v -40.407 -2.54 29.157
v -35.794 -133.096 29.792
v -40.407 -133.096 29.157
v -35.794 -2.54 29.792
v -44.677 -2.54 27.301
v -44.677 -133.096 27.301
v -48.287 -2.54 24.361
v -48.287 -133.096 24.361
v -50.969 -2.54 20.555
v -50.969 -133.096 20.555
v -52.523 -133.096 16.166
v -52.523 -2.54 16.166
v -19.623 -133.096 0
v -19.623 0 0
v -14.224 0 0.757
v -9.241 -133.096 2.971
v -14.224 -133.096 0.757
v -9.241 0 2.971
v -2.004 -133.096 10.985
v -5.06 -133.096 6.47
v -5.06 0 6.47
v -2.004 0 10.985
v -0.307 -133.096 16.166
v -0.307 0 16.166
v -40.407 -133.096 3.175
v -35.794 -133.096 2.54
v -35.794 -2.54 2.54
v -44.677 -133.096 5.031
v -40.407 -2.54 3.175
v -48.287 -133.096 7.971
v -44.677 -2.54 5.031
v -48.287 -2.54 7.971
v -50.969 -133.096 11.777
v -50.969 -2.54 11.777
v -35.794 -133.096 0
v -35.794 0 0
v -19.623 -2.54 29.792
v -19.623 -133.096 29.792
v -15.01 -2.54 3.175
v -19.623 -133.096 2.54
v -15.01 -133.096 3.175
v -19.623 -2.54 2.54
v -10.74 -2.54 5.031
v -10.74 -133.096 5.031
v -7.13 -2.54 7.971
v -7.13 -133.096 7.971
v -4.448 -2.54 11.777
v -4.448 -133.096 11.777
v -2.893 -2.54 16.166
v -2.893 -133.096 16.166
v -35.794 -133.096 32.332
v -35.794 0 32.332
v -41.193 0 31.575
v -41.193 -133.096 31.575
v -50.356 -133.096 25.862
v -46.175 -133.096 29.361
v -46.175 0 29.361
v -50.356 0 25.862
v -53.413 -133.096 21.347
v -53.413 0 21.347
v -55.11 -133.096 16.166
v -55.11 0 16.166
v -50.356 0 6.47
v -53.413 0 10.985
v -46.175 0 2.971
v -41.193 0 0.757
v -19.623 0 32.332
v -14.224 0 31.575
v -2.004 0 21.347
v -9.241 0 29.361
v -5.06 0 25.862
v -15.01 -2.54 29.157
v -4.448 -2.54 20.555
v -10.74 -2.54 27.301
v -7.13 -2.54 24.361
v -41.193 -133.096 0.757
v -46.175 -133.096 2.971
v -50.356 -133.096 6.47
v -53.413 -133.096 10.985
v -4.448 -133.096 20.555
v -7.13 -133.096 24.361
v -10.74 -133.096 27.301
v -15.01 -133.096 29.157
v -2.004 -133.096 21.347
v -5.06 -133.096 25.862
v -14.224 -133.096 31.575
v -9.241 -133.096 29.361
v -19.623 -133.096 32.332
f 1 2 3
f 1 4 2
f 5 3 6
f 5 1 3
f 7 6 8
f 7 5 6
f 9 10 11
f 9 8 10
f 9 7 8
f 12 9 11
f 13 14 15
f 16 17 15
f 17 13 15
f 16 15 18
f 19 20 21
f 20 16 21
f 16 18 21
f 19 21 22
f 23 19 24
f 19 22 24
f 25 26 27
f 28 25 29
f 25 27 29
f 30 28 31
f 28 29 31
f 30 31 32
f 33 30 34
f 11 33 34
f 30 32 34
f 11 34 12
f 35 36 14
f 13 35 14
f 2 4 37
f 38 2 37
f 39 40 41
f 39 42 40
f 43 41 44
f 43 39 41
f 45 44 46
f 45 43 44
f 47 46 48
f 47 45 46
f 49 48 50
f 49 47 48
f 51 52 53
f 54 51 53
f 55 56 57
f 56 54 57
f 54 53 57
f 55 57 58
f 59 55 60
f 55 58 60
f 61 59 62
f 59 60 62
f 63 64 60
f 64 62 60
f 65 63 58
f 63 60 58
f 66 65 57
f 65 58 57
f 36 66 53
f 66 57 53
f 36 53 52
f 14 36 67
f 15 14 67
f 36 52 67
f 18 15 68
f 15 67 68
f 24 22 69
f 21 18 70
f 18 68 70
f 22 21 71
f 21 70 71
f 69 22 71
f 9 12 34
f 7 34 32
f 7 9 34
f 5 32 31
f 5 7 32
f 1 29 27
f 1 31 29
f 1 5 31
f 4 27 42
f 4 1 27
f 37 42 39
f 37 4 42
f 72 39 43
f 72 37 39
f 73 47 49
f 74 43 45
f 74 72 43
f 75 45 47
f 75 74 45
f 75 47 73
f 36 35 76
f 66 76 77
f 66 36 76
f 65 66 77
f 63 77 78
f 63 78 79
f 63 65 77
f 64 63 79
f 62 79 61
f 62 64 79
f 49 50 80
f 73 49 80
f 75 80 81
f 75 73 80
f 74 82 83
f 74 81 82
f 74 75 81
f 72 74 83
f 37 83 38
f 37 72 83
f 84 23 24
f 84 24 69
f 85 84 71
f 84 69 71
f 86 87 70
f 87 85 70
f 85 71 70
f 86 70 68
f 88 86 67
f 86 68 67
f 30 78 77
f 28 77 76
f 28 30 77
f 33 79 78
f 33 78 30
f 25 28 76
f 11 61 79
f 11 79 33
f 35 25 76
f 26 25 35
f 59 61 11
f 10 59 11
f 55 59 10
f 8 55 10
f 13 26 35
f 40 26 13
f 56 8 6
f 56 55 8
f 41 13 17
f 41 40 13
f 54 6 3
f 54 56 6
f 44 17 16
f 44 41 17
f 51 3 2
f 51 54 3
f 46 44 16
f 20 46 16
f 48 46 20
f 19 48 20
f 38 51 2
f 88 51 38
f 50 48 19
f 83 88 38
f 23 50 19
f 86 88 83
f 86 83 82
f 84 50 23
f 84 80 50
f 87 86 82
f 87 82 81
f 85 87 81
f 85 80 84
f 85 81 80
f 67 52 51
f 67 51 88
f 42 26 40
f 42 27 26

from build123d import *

# Parameters (mm, degrees)
F0_W        = 55.4167628288
F0_H        = 32.3319099844
F1_DEPTH    = 133.096
F2_T1_DEPTH = 231.2096391748
F3_T        = -2.54


# Not quite as in the source:
# - a fillet or chamfer that OpenCascade refuses, or shapes differently, is made with other operations: its cross-section is extruded or revolved along the edge and cut away or added


with BuildPart() as f1:
    # F0 (on Front) → F1 (new body)
    with BuildSketch(Plane.XZ):
        with Locations((-27.7083814144, 16.1659549922)):
            Rectangle(F0_W, F0_H)
    extrude(amount=F1_DEPTH)

    # F2: fillet of radius 19.622727835 on 4 edges, made by hand

    # F2_s2 → F2_t1 (cut)
    with BuildSketch(Plane.XZ.offset(-49.0568195874)):
        with BuildLine():
            ThreePointArc((-35.7940349939, 32.3319099844), (-49.6693989113, 26.5845460669), (-55.4167628288, 12.7091821494))
            Line((-55.4167628288, 12.7091821494), (-55.4167628288, 32.3319099844))
            Line((-55.4167628288, 32.3319099844), (-35.7940349939, 32.3319099844))
        make_face()
        with BuildLine():
            ThreePointArc((0, 12.7091821494), (-5.7473639175, 26.5845460669), (-19.622727835, 32.3319099844))
            Line((-19.622727835, 32.3319099844), (0, 32.3319099844))
            Line((0, 32.3319099844), (0, 12.7091821494))
        make_face()
        with BuildLine():
            ThreePointArc((-19.622727835, 0), (-5.7473639175, 5.7473639175), (0, 19.622727835))
            Line((0, 19.622727835), (0, 0))
            Line((0, 0), (-19.622727835, 0))
        make_face()
        with BuildLine():
            ThreePointArc((-35.7940349939, 0), (-49.6693989113, 5.7473639175), (-55.4167628288, 19.622727835))
            Line((-55.4167628288, 19.622727835), (-55.4167628288, 0))
            Line((-55.4167628288, 0), (-35.7940349939, 0))
        make_face()
    extrude(amount=F2_T1_DEPTH, mode=Mode.SUBTRACT)

    # F3
    f3_openings = [f1.faces().sort_by_distance(p)[0] for p in [
        (-27.708381, -133.096, 16.165955),
    ]]
    offset(amount=F3_T, openings=f3_openings)


solid = f1.part
